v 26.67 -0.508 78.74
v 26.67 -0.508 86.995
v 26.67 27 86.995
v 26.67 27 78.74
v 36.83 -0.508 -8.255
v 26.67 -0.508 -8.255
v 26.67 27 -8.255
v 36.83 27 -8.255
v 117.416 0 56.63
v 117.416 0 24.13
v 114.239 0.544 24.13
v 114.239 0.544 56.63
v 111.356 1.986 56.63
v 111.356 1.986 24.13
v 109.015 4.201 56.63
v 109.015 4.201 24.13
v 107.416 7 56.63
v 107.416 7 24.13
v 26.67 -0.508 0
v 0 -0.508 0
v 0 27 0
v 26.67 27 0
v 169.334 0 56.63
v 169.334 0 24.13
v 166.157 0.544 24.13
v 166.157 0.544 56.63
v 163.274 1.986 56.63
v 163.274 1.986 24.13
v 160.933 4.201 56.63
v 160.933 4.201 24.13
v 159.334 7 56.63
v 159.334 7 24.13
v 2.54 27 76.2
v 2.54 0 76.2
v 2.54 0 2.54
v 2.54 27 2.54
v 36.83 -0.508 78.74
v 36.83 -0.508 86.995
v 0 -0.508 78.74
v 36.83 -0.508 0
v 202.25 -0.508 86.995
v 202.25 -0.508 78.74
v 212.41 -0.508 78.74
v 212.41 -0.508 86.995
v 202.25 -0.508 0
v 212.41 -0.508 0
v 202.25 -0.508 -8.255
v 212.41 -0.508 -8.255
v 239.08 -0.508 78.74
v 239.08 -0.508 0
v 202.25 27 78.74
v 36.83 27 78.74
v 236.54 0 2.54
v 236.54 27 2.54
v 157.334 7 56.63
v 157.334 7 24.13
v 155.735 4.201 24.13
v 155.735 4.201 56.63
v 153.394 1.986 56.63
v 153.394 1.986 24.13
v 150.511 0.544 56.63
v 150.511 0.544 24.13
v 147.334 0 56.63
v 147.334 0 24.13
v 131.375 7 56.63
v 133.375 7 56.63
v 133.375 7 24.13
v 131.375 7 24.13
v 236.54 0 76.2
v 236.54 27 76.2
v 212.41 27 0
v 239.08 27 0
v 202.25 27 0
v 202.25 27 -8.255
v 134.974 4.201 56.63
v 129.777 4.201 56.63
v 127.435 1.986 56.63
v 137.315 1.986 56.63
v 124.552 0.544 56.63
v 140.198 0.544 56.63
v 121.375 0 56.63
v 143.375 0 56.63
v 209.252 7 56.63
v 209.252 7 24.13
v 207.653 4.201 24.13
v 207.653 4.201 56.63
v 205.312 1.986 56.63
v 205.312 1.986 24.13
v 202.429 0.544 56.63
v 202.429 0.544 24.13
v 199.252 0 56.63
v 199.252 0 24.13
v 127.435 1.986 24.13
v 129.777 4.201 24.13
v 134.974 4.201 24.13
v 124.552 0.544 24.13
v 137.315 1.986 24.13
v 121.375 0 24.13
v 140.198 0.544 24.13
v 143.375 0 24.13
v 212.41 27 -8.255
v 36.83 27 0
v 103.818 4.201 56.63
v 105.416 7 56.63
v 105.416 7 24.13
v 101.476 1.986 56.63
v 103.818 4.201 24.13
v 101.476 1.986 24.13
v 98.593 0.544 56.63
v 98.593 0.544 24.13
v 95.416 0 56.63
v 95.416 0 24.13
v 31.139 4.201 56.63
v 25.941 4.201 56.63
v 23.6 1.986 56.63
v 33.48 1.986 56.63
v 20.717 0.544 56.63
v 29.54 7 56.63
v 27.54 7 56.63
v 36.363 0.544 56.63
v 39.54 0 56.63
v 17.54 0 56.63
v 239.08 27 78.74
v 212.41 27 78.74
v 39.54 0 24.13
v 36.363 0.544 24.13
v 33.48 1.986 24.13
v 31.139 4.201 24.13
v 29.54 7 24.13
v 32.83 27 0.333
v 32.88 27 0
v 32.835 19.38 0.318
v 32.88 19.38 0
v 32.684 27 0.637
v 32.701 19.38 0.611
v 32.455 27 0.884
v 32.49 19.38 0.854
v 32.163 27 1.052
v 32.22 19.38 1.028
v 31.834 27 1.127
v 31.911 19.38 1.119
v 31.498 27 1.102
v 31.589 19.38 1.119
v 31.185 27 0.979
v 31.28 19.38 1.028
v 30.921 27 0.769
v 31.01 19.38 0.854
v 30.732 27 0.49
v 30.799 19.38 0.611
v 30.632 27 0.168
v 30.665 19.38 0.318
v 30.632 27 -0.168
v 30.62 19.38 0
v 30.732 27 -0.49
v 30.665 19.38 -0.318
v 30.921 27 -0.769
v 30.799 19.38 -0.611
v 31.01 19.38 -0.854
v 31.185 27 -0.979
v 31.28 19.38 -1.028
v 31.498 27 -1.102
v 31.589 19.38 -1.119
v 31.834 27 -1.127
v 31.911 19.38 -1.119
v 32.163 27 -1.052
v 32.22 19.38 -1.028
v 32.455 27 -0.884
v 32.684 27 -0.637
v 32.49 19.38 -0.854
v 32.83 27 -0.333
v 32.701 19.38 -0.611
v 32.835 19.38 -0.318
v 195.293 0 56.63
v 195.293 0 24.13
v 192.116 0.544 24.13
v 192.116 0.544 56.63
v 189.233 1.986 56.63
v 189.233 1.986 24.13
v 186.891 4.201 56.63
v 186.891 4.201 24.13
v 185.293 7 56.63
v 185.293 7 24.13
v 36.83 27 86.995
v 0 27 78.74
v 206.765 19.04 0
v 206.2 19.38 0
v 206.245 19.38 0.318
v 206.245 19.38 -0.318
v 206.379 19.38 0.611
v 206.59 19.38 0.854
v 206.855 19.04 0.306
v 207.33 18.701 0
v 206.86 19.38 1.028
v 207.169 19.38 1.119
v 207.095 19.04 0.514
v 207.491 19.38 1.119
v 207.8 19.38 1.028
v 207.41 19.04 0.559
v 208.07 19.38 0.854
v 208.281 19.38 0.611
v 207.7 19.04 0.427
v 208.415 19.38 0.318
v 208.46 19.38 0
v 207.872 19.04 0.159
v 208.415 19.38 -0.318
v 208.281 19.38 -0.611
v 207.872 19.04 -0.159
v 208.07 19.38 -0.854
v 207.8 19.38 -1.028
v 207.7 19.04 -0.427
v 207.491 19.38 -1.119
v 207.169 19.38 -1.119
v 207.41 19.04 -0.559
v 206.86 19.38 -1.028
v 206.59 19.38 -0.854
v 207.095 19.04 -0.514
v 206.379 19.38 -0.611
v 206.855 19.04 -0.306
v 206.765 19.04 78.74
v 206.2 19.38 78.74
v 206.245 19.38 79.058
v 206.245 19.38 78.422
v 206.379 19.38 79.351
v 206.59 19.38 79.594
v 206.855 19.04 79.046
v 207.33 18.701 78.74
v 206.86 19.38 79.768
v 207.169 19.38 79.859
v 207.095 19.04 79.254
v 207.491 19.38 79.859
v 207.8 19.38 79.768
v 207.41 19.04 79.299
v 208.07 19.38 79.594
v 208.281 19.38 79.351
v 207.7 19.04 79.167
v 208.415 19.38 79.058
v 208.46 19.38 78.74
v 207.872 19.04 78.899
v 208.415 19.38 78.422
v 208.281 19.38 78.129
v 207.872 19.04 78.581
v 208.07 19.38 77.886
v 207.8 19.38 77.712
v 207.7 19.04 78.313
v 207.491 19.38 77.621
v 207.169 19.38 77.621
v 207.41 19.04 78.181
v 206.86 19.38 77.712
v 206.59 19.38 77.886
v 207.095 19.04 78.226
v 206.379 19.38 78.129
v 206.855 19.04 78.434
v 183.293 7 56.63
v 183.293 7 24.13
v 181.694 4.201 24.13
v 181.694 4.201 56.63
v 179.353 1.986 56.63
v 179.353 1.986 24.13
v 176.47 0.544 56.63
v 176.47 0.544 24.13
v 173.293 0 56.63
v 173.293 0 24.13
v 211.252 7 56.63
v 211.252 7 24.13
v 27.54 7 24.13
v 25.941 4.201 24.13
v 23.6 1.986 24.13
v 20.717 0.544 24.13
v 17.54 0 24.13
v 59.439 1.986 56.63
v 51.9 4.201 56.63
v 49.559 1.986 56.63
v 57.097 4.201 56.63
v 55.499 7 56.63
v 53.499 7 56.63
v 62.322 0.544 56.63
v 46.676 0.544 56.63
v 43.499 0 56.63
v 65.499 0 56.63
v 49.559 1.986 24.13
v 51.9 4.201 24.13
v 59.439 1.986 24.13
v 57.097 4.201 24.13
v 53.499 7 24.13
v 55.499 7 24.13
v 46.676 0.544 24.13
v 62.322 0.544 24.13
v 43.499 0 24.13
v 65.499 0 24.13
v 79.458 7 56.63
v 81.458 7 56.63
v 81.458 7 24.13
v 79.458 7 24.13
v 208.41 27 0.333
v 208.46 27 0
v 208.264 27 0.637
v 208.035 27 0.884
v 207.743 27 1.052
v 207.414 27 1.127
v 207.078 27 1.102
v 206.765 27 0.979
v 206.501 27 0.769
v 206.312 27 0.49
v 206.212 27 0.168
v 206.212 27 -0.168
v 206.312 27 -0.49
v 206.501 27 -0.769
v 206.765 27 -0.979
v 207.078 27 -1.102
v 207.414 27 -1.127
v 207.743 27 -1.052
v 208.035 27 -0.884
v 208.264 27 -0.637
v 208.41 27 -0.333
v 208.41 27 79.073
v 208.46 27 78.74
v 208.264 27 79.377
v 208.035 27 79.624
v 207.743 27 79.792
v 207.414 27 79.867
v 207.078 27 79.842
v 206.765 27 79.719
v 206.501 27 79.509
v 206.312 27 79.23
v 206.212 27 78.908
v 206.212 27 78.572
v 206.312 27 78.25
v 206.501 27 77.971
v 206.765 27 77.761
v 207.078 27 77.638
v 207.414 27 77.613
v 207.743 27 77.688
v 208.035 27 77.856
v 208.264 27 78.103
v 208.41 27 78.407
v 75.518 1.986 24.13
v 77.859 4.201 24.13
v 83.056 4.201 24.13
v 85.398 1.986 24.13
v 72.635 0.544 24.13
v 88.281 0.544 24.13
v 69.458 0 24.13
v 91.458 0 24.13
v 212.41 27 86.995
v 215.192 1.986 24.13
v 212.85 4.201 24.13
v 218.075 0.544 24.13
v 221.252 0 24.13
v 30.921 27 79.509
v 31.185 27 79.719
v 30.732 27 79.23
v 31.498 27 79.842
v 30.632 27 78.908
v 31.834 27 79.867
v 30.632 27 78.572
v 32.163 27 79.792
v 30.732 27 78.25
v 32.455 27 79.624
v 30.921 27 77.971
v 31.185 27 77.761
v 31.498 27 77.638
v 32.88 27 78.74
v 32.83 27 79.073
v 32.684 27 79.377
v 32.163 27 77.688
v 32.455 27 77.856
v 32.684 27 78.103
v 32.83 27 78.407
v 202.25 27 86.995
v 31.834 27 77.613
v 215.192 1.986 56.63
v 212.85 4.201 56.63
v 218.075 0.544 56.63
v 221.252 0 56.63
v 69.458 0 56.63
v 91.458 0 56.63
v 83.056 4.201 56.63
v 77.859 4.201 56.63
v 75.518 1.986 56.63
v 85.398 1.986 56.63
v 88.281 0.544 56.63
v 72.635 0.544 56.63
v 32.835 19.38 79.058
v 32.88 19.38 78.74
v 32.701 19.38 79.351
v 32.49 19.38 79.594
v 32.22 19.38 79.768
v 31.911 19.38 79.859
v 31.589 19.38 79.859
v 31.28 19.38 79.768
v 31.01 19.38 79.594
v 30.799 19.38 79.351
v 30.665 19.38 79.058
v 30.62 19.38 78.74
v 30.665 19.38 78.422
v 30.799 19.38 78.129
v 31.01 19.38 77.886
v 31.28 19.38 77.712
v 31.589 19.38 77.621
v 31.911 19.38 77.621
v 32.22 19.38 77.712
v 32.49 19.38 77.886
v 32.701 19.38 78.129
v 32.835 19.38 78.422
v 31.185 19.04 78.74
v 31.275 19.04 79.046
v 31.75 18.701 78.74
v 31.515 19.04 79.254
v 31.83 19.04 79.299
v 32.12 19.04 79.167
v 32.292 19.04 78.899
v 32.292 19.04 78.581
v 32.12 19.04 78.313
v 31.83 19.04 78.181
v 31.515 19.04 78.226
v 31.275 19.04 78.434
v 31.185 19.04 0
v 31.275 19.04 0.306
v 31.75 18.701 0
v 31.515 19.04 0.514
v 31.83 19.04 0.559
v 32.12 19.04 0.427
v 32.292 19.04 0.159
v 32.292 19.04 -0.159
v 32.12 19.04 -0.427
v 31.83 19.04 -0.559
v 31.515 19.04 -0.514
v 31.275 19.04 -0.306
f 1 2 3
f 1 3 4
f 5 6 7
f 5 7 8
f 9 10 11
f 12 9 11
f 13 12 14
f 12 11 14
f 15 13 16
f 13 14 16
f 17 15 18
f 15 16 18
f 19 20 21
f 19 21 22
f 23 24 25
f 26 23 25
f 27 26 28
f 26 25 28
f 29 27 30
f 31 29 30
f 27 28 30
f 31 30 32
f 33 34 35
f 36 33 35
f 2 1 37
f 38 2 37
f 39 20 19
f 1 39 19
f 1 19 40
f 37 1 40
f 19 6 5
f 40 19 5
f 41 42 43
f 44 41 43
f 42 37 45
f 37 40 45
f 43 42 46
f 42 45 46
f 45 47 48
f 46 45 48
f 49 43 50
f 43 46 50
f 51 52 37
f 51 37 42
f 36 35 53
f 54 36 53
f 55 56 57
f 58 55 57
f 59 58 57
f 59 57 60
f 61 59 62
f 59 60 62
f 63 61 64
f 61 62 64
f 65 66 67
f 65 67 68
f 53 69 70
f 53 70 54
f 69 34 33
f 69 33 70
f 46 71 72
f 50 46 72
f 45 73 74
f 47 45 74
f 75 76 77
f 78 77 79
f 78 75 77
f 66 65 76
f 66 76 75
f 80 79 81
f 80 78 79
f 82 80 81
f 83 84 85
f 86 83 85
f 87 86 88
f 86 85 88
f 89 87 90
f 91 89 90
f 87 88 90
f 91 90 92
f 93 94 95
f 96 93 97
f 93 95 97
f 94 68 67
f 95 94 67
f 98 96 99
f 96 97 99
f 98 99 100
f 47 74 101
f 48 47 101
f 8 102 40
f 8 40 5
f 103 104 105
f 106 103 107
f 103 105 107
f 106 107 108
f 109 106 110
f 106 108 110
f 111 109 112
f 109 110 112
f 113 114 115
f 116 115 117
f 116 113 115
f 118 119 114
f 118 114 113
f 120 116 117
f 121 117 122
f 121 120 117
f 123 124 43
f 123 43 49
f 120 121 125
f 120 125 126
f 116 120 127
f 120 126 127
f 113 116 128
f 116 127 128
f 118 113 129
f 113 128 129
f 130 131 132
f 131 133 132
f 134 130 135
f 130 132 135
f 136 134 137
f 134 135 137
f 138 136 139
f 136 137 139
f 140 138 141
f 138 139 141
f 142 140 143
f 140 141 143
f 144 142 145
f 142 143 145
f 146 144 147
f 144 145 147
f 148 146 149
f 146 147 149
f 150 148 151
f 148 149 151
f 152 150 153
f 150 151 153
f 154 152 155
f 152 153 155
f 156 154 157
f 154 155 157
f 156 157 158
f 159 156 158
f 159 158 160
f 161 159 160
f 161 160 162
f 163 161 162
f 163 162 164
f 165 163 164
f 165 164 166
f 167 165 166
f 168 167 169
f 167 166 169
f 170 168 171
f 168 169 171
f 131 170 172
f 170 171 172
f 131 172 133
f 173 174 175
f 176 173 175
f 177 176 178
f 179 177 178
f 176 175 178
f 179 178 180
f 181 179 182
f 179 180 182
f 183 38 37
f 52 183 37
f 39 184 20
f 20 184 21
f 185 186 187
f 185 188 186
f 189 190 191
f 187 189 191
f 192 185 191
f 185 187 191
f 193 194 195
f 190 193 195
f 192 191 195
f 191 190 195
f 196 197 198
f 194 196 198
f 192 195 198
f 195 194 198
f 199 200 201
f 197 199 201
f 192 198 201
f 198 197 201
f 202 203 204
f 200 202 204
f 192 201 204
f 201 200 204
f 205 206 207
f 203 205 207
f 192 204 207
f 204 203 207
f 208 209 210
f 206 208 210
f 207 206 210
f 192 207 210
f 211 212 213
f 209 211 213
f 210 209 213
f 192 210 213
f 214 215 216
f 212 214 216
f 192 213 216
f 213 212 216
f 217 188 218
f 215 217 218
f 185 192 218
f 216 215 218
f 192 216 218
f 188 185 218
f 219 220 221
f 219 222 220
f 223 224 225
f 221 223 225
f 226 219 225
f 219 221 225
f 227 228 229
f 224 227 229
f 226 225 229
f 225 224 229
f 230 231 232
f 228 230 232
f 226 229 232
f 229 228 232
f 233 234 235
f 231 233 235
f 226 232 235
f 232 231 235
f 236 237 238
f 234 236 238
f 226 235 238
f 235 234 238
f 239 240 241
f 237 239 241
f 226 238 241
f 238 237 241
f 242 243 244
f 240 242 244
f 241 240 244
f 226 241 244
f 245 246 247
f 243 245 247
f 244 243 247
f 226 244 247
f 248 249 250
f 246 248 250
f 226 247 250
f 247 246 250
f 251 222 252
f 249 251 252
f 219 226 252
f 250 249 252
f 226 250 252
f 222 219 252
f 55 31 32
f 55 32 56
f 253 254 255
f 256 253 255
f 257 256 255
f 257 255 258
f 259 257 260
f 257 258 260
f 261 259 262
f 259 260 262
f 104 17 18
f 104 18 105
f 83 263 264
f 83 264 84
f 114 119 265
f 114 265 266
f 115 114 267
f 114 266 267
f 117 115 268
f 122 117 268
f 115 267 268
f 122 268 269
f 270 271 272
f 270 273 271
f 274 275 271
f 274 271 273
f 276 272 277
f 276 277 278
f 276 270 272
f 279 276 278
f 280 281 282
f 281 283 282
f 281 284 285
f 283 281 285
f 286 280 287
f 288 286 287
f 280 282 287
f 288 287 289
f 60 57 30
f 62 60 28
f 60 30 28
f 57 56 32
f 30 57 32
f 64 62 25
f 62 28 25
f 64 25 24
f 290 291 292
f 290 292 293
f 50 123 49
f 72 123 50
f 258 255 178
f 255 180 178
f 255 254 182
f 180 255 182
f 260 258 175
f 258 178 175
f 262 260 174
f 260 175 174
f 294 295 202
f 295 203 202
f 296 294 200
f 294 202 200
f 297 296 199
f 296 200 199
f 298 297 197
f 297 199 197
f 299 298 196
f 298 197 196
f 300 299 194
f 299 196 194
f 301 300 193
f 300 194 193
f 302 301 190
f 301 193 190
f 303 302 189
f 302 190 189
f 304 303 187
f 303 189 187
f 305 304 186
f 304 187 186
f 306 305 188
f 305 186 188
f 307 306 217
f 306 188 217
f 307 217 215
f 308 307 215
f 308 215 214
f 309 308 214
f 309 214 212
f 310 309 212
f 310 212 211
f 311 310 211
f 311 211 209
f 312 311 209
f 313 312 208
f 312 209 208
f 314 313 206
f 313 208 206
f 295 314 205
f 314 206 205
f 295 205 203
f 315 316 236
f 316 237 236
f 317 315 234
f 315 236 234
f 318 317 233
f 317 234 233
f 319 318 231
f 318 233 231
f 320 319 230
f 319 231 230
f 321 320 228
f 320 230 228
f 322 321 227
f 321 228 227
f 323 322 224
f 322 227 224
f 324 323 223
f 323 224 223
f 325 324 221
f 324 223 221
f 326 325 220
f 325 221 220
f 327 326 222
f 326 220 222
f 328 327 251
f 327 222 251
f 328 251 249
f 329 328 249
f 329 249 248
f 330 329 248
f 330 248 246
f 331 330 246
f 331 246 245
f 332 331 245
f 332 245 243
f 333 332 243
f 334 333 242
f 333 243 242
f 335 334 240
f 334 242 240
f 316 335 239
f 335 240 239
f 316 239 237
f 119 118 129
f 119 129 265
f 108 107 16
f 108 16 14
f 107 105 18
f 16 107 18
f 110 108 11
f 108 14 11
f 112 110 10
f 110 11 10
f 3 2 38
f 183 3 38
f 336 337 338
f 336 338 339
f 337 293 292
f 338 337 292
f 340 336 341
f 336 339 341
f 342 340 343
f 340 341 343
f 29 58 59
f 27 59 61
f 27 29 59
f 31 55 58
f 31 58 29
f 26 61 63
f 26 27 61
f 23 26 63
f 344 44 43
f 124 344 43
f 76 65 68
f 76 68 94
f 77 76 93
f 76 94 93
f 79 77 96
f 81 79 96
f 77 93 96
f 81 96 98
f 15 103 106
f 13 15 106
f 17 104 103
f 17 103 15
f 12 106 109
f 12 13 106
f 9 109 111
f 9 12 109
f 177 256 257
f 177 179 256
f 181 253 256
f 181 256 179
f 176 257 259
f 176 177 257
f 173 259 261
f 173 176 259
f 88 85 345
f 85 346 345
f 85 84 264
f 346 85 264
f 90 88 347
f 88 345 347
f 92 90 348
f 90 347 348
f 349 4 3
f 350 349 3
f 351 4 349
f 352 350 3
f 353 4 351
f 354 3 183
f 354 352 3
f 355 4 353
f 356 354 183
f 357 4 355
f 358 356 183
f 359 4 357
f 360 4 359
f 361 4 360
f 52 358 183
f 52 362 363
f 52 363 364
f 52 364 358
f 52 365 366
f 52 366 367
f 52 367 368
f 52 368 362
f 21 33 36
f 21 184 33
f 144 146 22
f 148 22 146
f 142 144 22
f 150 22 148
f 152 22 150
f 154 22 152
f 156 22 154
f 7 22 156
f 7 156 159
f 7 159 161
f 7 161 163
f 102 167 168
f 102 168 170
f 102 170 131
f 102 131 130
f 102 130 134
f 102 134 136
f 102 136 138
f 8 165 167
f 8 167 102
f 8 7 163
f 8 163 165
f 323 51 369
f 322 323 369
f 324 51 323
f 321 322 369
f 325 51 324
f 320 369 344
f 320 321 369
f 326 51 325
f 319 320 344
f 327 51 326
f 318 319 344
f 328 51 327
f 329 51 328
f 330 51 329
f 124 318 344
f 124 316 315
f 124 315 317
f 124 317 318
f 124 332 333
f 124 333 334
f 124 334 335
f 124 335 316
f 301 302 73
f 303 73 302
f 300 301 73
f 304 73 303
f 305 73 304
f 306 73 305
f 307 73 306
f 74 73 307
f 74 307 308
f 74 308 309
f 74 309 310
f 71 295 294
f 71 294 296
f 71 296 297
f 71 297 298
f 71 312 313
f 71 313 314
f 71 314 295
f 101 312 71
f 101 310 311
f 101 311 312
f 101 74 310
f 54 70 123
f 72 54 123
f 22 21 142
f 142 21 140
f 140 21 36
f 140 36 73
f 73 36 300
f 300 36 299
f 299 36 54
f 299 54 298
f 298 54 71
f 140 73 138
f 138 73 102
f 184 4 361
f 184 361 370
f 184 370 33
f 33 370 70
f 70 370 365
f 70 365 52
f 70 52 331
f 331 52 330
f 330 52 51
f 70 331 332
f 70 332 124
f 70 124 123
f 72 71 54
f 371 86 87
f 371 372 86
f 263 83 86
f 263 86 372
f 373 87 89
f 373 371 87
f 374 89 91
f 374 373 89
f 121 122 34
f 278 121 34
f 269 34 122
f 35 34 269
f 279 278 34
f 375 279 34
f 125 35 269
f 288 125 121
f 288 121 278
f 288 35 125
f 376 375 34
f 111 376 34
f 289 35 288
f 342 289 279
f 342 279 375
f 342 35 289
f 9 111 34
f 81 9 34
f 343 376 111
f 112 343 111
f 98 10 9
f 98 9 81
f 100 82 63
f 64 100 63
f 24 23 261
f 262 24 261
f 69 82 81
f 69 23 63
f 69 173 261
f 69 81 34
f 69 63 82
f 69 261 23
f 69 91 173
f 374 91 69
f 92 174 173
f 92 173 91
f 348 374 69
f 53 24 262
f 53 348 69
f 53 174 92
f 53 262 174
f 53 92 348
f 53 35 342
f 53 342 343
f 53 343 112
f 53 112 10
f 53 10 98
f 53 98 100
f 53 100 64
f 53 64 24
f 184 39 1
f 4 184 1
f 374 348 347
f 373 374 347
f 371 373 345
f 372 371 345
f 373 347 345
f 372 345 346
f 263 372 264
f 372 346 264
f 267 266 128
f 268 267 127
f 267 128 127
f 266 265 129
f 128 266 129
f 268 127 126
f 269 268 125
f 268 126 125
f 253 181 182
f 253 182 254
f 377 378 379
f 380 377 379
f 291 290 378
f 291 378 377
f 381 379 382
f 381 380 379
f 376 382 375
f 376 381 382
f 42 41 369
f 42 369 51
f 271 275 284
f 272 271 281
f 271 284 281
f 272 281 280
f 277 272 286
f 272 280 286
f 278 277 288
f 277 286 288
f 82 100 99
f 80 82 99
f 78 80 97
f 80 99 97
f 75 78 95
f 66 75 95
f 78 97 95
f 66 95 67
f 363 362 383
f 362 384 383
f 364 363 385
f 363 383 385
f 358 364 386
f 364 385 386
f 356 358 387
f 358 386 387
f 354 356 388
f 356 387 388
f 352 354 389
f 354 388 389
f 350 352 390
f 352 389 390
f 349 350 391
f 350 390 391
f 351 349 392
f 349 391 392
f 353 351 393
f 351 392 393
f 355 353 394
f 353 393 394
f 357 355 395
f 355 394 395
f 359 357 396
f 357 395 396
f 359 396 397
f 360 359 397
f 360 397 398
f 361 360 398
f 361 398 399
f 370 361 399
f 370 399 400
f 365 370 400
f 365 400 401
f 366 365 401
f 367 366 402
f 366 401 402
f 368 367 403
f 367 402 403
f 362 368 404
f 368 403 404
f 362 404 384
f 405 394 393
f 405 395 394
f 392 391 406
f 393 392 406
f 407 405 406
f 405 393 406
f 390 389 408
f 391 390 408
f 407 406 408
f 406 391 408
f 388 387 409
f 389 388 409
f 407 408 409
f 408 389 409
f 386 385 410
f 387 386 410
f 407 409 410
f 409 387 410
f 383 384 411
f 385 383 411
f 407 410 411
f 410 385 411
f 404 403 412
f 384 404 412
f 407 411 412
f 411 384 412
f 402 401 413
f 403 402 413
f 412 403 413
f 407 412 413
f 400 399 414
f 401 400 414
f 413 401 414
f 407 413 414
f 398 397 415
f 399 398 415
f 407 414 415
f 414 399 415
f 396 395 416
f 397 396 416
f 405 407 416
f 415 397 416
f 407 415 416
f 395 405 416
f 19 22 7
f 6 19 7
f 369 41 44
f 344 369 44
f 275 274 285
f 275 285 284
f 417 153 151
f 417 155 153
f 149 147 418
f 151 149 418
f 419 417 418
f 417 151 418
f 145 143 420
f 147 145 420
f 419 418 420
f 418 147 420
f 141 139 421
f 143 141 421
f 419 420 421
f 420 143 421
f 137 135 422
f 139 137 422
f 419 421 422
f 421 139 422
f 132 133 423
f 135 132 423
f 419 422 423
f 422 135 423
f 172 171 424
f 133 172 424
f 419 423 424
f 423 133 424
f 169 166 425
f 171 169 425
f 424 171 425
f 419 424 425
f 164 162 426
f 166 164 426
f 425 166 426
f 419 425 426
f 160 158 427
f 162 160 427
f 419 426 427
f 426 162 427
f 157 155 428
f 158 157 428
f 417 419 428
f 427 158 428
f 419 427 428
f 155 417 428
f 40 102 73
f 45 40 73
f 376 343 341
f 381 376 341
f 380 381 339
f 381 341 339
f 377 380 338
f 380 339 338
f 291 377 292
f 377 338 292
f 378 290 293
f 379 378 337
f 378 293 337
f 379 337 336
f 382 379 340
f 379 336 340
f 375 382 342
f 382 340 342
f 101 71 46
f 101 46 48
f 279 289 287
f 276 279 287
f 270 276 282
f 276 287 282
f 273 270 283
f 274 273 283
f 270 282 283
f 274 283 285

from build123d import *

# Parameters (mm, degrees)
SKETCH1_W                 = 239.08
SKETCH1_H                 = 78.74
BOSS_EXTRUDE1_DEPTH       = 0.508
SKETCH1_3_W               = 239.08
SKETCH1_3_H               = 8.255
SKETCH1_3_H_2             = 78.74
SKETCH1_3_W_2             = 234
SKETCH1_3_H_3             = 73.66
BOSS_EXTRUDE2_DEPTH       = 27
BOSS_EXTRUDE3_START       = 21.59
BOSS_EXTRUDE3_DEPTH       = 32.5
SKETCH1_4_W               = 239.08
SKETCH1_4_H               = 8.255
BOSS_EXTRUDE4_DEPTH       = 0.508
F_4_40_TAPPED_HOLE2_D     = 2.2606
F_4_40_TAPPED_HOLE2_DEPTH = 7.62
F_4_40_TAPPED_HOLE2_TIP   = 0.679152758
SKETCH13_W                = 165.42
SKETCH13_H                = 8.255
SKETCH13_W_2              = 26.67
CUT_EXTRUDE1_DEPTH        = 28.508


with BuildPart() as part:
    # Sketch1 → Boss-Extrude1 (new body)
    with BuildSketch(Plane(origin=(0, 0, 0), x_dir=(1, 0, 0), z_dir=(0, 1, 0))):
        with Locations((119.54, -39.37)):
            Rectangle(SKETCH1_W, SKETCH1_H)
    extrude(amount=-BOSS_EXTRUDE1_DEPTH)

    # Sketch1<3> → Boss-Extrude2 (add)
    with BuildSketch(Plane(origin=(0, 0, 0), x_dir=(1, 0, 0), z_dir=(0, 1, 0))):
        with Locations((119.54, 4.1275)):
            Rectangle(SKETCH1_3_W, SKETCH1_3_H)
        with Locations((119.54, -82.8675)):
            Rectangle(SKETCH1_3_W, SKETCH1_3_H)
        with Locations((119.54, -39.37)):
            Rectangle(SKETCH1_3_W, SKETCH1_3_H_2)
        with Locations((119.54, -39.37)):
            Rectangle(SKETCH1_3_W_2, SKETCH1_3_H_3, mode=Mode.SUBTRACT)
    extrude(amount=BOSS_EXTRUDE2_DEPTH)

    # Sketch5 → Boss-Extrude3 (add)
    with BuildSketch(Plane.XY.offset(2.54).offset(BOSS_EXTRUDE3_START)):
        with BuildLine():
            Line((29.54, 7), (27.54, 7))
            ThreePointArc((27.54, 7), (23.600043647, 1.985651932), (17.54, 0))
            Line((17.54, 0), (39.54, 0))
            ThreePointArc((39.54, 0), (33.479956353, 1.985651932), (29.54, 7))
        make_face()
        with BuildLine():
            Line((55.4988, 7), (53.4988, 7))
            ThreePointArc((53.4988, 7), (49.558843647, 1.985651932), (43.4988, 0))
            Line((43.4988, 0), (65.4988, 0))
            ThreePointArc((65.4988, 0), (59.438756353, 1.985651932), (55.4988, 7))
        make_face()
        with BuildLine():
            Line((81.4576, 7), (79.4576, 7))
            ThreePointArc((79.4576, 7), (75.517643647, 1.985651932), (69.4576, 0))
            Line((69.4576, 0), (91.4576, 0))
            ThreePointArc((91.4576, 0), (85.397556353, 1.985651932), (81.4576, 7))
        make_face()
        with BuildLine():
            Line((107.4164, 7), (105.4164, 7))
            ThreePointArc((105.4164, 7), (101.476443647, 1.985651932), (95.4164, 0))
            Line((95.4164, 0), (117.4164, 0))
            ThreePointArc((117.4164, 0), (111.356356353, 1.985651932), (107.4164, 7))
        make_face()
        with BuildLine():
            Line((133.3752, 7), (131.3752, 7))
            ThreePointArc((131.3752, 7), (127.435243647, 1.985651932), (121.3752, 0))
            Line((121.3752, 0), (143.3752, 0))
            ThreePointArc((143.3752, 0), (137.315156353, 1.985651932), (133.3752, 7))
        make_face()
        with BuildLine():
            Line((159.334, 7), (157.334, 7))
            ThreePointArc((157.334, 7), (153.394043647, 1.985651932), (147.334, 0))
            Line((147.334, 0), (169.334, 0))
            ThreePointArc((169.334, 0), (163.273956353, 1.985651932), (159.334, 7))
        make_face()
        with BuildLine():
            Line((185.2928, 7), (183.2928, 7))
            ThreePointArc((183.2928, 7), (179.352843647, 1.985651932), (173.2928, 0))
            Line((173.2928, 0), (195.2928, 0))
            ThreePointArc((195.2928, 0), (189.232756353, 1.985651932), (185.2928, 7))
        make_face()
        with BuildLine():
            Line((211.2516, 7), (209.2516, 7))
            ThreePointArc((209.2516, 7), (205.311643647, 1.985651932), (199.2516, 0))
            Line((199.2516, 0), (221.2516, 0))
            ThreePointArc((221.2516, 0), (215.191556353, 1.985651932), (211.2516, 7))
        make_face()
    extrude(amount=BOSS_EXTRUDE3_DEPTH)

    # Sketch1<4> → Boss-Extrude4 (add)
    with BuildSketch(Plane(origin=(0, 0, 0), x_dir=(1, 0, 0), z_dir=(0, 1, 0))):
        with Locations((119.54, 4.1275)):
            Rectangle(SKETCH1_4_W, SKETCH1_4_H)
        with Locations((119.54, -82.8675)):
            Rectangle(SKETCH1_4_W, SKETCH1_4_H)
    extrude(amount=-BOSS_EXTRUDE4_DEPTH)

    # #4-40 Tapped Hole2
    with Locations(Plane(origin=(0, 27, 0), x_dir=(-1, 0, 0), z_dir=(0, 1, 0))):
        with Locations((-31.75, 0), (-207.33, 0), (-31.75, 78.74), (-207.33, 78.74)):
            Hole(F_4_40_TAPPED_HOLE2_D / 2, depth=F_4_40_TAPPED_HOLE2_DEPTH)
            with Locations((0, 0, -(F_4_40_TAPPED_HOLE2_DEPTH + F_4_40_TAPPED_HOLE2_TIP / 2))):  # 118° drill point
                Cone(0, F_4_40_TAPPED_HOLE2_D / 2, F_4_40_TAPPED_HOLE2_TIP, mode=Mode.SUBTRACT)

    # Sketch13 → Cut-Extrude1 (cut, through all)
    with BuildSketch(Plane(origin=(0, 27, 0), x_dir=(1, 0, 0), z_dir=(0, 1, 0))):
        with Locations((119.54, 4.1275)):
            Rectangle(SKETCH13_W, SKETCH13_H)
        with Locations((119.54, -82.8675)):
            Rectangle(SKETCH13_W, SKETCH13_H)
        with Locations((13.335, 4.1275)):
            Rectangle(SKETCH13_W_2, SKETCH13_H)
        with Locations((225.745, 4.1275)):
            Rectangle(SKETCH13_W_2, SKETCH13_H)
        with Locations((225.745, -82.8675)):
            Rectangle(SKETCH13_W_2, SKETCH13_H)
        with Locations((13.335, -82.8675)):
            Rectangle(SKETCH13_W_2, SKETCH13_H)
    extrude(amount=-CUT_EXTRUDE1_DEPTH, mode=Mode.SUBTRACT)


solid = part.part
